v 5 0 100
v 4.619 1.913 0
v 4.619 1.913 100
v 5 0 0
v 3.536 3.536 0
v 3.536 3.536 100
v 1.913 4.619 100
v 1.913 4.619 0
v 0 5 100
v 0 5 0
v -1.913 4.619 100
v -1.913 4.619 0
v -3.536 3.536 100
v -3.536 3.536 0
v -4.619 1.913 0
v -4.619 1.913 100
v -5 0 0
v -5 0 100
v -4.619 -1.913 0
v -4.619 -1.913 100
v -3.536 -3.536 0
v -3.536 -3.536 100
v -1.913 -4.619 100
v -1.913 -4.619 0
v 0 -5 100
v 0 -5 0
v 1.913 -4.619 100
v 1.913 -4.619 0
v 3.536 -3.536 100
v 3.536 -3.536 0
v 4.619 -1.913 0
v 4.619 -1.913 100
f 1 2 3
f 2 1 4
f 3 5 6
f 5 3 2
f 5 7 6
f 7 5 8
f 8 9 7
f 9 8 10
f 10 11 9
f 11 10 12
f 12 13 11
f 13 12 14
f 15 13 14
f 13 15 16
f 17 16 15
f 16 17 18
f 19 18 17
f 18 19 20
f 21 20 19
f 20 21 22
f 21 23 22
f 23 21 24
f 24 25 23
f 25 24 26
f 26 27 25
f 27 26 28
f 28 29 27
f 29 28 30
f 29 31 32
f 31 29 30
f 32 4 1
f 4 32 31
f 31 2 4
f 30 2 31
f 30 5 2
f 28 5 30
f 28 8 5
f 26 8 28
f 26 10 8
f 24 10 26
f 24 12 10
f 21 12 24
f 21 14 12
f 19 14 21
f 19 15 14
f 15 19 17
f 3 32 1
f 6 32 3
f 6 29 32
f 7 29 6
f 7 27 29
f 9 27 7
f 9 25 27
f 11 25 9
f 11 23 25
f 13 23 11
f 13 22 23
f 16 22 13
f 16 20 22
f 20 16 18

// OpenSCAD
// Unit of length: Unit.MM
cylinder(h = 100.0, d = 10.0, center = false, $fa = 12.0, $fs = 2.0, $fn = 0);
